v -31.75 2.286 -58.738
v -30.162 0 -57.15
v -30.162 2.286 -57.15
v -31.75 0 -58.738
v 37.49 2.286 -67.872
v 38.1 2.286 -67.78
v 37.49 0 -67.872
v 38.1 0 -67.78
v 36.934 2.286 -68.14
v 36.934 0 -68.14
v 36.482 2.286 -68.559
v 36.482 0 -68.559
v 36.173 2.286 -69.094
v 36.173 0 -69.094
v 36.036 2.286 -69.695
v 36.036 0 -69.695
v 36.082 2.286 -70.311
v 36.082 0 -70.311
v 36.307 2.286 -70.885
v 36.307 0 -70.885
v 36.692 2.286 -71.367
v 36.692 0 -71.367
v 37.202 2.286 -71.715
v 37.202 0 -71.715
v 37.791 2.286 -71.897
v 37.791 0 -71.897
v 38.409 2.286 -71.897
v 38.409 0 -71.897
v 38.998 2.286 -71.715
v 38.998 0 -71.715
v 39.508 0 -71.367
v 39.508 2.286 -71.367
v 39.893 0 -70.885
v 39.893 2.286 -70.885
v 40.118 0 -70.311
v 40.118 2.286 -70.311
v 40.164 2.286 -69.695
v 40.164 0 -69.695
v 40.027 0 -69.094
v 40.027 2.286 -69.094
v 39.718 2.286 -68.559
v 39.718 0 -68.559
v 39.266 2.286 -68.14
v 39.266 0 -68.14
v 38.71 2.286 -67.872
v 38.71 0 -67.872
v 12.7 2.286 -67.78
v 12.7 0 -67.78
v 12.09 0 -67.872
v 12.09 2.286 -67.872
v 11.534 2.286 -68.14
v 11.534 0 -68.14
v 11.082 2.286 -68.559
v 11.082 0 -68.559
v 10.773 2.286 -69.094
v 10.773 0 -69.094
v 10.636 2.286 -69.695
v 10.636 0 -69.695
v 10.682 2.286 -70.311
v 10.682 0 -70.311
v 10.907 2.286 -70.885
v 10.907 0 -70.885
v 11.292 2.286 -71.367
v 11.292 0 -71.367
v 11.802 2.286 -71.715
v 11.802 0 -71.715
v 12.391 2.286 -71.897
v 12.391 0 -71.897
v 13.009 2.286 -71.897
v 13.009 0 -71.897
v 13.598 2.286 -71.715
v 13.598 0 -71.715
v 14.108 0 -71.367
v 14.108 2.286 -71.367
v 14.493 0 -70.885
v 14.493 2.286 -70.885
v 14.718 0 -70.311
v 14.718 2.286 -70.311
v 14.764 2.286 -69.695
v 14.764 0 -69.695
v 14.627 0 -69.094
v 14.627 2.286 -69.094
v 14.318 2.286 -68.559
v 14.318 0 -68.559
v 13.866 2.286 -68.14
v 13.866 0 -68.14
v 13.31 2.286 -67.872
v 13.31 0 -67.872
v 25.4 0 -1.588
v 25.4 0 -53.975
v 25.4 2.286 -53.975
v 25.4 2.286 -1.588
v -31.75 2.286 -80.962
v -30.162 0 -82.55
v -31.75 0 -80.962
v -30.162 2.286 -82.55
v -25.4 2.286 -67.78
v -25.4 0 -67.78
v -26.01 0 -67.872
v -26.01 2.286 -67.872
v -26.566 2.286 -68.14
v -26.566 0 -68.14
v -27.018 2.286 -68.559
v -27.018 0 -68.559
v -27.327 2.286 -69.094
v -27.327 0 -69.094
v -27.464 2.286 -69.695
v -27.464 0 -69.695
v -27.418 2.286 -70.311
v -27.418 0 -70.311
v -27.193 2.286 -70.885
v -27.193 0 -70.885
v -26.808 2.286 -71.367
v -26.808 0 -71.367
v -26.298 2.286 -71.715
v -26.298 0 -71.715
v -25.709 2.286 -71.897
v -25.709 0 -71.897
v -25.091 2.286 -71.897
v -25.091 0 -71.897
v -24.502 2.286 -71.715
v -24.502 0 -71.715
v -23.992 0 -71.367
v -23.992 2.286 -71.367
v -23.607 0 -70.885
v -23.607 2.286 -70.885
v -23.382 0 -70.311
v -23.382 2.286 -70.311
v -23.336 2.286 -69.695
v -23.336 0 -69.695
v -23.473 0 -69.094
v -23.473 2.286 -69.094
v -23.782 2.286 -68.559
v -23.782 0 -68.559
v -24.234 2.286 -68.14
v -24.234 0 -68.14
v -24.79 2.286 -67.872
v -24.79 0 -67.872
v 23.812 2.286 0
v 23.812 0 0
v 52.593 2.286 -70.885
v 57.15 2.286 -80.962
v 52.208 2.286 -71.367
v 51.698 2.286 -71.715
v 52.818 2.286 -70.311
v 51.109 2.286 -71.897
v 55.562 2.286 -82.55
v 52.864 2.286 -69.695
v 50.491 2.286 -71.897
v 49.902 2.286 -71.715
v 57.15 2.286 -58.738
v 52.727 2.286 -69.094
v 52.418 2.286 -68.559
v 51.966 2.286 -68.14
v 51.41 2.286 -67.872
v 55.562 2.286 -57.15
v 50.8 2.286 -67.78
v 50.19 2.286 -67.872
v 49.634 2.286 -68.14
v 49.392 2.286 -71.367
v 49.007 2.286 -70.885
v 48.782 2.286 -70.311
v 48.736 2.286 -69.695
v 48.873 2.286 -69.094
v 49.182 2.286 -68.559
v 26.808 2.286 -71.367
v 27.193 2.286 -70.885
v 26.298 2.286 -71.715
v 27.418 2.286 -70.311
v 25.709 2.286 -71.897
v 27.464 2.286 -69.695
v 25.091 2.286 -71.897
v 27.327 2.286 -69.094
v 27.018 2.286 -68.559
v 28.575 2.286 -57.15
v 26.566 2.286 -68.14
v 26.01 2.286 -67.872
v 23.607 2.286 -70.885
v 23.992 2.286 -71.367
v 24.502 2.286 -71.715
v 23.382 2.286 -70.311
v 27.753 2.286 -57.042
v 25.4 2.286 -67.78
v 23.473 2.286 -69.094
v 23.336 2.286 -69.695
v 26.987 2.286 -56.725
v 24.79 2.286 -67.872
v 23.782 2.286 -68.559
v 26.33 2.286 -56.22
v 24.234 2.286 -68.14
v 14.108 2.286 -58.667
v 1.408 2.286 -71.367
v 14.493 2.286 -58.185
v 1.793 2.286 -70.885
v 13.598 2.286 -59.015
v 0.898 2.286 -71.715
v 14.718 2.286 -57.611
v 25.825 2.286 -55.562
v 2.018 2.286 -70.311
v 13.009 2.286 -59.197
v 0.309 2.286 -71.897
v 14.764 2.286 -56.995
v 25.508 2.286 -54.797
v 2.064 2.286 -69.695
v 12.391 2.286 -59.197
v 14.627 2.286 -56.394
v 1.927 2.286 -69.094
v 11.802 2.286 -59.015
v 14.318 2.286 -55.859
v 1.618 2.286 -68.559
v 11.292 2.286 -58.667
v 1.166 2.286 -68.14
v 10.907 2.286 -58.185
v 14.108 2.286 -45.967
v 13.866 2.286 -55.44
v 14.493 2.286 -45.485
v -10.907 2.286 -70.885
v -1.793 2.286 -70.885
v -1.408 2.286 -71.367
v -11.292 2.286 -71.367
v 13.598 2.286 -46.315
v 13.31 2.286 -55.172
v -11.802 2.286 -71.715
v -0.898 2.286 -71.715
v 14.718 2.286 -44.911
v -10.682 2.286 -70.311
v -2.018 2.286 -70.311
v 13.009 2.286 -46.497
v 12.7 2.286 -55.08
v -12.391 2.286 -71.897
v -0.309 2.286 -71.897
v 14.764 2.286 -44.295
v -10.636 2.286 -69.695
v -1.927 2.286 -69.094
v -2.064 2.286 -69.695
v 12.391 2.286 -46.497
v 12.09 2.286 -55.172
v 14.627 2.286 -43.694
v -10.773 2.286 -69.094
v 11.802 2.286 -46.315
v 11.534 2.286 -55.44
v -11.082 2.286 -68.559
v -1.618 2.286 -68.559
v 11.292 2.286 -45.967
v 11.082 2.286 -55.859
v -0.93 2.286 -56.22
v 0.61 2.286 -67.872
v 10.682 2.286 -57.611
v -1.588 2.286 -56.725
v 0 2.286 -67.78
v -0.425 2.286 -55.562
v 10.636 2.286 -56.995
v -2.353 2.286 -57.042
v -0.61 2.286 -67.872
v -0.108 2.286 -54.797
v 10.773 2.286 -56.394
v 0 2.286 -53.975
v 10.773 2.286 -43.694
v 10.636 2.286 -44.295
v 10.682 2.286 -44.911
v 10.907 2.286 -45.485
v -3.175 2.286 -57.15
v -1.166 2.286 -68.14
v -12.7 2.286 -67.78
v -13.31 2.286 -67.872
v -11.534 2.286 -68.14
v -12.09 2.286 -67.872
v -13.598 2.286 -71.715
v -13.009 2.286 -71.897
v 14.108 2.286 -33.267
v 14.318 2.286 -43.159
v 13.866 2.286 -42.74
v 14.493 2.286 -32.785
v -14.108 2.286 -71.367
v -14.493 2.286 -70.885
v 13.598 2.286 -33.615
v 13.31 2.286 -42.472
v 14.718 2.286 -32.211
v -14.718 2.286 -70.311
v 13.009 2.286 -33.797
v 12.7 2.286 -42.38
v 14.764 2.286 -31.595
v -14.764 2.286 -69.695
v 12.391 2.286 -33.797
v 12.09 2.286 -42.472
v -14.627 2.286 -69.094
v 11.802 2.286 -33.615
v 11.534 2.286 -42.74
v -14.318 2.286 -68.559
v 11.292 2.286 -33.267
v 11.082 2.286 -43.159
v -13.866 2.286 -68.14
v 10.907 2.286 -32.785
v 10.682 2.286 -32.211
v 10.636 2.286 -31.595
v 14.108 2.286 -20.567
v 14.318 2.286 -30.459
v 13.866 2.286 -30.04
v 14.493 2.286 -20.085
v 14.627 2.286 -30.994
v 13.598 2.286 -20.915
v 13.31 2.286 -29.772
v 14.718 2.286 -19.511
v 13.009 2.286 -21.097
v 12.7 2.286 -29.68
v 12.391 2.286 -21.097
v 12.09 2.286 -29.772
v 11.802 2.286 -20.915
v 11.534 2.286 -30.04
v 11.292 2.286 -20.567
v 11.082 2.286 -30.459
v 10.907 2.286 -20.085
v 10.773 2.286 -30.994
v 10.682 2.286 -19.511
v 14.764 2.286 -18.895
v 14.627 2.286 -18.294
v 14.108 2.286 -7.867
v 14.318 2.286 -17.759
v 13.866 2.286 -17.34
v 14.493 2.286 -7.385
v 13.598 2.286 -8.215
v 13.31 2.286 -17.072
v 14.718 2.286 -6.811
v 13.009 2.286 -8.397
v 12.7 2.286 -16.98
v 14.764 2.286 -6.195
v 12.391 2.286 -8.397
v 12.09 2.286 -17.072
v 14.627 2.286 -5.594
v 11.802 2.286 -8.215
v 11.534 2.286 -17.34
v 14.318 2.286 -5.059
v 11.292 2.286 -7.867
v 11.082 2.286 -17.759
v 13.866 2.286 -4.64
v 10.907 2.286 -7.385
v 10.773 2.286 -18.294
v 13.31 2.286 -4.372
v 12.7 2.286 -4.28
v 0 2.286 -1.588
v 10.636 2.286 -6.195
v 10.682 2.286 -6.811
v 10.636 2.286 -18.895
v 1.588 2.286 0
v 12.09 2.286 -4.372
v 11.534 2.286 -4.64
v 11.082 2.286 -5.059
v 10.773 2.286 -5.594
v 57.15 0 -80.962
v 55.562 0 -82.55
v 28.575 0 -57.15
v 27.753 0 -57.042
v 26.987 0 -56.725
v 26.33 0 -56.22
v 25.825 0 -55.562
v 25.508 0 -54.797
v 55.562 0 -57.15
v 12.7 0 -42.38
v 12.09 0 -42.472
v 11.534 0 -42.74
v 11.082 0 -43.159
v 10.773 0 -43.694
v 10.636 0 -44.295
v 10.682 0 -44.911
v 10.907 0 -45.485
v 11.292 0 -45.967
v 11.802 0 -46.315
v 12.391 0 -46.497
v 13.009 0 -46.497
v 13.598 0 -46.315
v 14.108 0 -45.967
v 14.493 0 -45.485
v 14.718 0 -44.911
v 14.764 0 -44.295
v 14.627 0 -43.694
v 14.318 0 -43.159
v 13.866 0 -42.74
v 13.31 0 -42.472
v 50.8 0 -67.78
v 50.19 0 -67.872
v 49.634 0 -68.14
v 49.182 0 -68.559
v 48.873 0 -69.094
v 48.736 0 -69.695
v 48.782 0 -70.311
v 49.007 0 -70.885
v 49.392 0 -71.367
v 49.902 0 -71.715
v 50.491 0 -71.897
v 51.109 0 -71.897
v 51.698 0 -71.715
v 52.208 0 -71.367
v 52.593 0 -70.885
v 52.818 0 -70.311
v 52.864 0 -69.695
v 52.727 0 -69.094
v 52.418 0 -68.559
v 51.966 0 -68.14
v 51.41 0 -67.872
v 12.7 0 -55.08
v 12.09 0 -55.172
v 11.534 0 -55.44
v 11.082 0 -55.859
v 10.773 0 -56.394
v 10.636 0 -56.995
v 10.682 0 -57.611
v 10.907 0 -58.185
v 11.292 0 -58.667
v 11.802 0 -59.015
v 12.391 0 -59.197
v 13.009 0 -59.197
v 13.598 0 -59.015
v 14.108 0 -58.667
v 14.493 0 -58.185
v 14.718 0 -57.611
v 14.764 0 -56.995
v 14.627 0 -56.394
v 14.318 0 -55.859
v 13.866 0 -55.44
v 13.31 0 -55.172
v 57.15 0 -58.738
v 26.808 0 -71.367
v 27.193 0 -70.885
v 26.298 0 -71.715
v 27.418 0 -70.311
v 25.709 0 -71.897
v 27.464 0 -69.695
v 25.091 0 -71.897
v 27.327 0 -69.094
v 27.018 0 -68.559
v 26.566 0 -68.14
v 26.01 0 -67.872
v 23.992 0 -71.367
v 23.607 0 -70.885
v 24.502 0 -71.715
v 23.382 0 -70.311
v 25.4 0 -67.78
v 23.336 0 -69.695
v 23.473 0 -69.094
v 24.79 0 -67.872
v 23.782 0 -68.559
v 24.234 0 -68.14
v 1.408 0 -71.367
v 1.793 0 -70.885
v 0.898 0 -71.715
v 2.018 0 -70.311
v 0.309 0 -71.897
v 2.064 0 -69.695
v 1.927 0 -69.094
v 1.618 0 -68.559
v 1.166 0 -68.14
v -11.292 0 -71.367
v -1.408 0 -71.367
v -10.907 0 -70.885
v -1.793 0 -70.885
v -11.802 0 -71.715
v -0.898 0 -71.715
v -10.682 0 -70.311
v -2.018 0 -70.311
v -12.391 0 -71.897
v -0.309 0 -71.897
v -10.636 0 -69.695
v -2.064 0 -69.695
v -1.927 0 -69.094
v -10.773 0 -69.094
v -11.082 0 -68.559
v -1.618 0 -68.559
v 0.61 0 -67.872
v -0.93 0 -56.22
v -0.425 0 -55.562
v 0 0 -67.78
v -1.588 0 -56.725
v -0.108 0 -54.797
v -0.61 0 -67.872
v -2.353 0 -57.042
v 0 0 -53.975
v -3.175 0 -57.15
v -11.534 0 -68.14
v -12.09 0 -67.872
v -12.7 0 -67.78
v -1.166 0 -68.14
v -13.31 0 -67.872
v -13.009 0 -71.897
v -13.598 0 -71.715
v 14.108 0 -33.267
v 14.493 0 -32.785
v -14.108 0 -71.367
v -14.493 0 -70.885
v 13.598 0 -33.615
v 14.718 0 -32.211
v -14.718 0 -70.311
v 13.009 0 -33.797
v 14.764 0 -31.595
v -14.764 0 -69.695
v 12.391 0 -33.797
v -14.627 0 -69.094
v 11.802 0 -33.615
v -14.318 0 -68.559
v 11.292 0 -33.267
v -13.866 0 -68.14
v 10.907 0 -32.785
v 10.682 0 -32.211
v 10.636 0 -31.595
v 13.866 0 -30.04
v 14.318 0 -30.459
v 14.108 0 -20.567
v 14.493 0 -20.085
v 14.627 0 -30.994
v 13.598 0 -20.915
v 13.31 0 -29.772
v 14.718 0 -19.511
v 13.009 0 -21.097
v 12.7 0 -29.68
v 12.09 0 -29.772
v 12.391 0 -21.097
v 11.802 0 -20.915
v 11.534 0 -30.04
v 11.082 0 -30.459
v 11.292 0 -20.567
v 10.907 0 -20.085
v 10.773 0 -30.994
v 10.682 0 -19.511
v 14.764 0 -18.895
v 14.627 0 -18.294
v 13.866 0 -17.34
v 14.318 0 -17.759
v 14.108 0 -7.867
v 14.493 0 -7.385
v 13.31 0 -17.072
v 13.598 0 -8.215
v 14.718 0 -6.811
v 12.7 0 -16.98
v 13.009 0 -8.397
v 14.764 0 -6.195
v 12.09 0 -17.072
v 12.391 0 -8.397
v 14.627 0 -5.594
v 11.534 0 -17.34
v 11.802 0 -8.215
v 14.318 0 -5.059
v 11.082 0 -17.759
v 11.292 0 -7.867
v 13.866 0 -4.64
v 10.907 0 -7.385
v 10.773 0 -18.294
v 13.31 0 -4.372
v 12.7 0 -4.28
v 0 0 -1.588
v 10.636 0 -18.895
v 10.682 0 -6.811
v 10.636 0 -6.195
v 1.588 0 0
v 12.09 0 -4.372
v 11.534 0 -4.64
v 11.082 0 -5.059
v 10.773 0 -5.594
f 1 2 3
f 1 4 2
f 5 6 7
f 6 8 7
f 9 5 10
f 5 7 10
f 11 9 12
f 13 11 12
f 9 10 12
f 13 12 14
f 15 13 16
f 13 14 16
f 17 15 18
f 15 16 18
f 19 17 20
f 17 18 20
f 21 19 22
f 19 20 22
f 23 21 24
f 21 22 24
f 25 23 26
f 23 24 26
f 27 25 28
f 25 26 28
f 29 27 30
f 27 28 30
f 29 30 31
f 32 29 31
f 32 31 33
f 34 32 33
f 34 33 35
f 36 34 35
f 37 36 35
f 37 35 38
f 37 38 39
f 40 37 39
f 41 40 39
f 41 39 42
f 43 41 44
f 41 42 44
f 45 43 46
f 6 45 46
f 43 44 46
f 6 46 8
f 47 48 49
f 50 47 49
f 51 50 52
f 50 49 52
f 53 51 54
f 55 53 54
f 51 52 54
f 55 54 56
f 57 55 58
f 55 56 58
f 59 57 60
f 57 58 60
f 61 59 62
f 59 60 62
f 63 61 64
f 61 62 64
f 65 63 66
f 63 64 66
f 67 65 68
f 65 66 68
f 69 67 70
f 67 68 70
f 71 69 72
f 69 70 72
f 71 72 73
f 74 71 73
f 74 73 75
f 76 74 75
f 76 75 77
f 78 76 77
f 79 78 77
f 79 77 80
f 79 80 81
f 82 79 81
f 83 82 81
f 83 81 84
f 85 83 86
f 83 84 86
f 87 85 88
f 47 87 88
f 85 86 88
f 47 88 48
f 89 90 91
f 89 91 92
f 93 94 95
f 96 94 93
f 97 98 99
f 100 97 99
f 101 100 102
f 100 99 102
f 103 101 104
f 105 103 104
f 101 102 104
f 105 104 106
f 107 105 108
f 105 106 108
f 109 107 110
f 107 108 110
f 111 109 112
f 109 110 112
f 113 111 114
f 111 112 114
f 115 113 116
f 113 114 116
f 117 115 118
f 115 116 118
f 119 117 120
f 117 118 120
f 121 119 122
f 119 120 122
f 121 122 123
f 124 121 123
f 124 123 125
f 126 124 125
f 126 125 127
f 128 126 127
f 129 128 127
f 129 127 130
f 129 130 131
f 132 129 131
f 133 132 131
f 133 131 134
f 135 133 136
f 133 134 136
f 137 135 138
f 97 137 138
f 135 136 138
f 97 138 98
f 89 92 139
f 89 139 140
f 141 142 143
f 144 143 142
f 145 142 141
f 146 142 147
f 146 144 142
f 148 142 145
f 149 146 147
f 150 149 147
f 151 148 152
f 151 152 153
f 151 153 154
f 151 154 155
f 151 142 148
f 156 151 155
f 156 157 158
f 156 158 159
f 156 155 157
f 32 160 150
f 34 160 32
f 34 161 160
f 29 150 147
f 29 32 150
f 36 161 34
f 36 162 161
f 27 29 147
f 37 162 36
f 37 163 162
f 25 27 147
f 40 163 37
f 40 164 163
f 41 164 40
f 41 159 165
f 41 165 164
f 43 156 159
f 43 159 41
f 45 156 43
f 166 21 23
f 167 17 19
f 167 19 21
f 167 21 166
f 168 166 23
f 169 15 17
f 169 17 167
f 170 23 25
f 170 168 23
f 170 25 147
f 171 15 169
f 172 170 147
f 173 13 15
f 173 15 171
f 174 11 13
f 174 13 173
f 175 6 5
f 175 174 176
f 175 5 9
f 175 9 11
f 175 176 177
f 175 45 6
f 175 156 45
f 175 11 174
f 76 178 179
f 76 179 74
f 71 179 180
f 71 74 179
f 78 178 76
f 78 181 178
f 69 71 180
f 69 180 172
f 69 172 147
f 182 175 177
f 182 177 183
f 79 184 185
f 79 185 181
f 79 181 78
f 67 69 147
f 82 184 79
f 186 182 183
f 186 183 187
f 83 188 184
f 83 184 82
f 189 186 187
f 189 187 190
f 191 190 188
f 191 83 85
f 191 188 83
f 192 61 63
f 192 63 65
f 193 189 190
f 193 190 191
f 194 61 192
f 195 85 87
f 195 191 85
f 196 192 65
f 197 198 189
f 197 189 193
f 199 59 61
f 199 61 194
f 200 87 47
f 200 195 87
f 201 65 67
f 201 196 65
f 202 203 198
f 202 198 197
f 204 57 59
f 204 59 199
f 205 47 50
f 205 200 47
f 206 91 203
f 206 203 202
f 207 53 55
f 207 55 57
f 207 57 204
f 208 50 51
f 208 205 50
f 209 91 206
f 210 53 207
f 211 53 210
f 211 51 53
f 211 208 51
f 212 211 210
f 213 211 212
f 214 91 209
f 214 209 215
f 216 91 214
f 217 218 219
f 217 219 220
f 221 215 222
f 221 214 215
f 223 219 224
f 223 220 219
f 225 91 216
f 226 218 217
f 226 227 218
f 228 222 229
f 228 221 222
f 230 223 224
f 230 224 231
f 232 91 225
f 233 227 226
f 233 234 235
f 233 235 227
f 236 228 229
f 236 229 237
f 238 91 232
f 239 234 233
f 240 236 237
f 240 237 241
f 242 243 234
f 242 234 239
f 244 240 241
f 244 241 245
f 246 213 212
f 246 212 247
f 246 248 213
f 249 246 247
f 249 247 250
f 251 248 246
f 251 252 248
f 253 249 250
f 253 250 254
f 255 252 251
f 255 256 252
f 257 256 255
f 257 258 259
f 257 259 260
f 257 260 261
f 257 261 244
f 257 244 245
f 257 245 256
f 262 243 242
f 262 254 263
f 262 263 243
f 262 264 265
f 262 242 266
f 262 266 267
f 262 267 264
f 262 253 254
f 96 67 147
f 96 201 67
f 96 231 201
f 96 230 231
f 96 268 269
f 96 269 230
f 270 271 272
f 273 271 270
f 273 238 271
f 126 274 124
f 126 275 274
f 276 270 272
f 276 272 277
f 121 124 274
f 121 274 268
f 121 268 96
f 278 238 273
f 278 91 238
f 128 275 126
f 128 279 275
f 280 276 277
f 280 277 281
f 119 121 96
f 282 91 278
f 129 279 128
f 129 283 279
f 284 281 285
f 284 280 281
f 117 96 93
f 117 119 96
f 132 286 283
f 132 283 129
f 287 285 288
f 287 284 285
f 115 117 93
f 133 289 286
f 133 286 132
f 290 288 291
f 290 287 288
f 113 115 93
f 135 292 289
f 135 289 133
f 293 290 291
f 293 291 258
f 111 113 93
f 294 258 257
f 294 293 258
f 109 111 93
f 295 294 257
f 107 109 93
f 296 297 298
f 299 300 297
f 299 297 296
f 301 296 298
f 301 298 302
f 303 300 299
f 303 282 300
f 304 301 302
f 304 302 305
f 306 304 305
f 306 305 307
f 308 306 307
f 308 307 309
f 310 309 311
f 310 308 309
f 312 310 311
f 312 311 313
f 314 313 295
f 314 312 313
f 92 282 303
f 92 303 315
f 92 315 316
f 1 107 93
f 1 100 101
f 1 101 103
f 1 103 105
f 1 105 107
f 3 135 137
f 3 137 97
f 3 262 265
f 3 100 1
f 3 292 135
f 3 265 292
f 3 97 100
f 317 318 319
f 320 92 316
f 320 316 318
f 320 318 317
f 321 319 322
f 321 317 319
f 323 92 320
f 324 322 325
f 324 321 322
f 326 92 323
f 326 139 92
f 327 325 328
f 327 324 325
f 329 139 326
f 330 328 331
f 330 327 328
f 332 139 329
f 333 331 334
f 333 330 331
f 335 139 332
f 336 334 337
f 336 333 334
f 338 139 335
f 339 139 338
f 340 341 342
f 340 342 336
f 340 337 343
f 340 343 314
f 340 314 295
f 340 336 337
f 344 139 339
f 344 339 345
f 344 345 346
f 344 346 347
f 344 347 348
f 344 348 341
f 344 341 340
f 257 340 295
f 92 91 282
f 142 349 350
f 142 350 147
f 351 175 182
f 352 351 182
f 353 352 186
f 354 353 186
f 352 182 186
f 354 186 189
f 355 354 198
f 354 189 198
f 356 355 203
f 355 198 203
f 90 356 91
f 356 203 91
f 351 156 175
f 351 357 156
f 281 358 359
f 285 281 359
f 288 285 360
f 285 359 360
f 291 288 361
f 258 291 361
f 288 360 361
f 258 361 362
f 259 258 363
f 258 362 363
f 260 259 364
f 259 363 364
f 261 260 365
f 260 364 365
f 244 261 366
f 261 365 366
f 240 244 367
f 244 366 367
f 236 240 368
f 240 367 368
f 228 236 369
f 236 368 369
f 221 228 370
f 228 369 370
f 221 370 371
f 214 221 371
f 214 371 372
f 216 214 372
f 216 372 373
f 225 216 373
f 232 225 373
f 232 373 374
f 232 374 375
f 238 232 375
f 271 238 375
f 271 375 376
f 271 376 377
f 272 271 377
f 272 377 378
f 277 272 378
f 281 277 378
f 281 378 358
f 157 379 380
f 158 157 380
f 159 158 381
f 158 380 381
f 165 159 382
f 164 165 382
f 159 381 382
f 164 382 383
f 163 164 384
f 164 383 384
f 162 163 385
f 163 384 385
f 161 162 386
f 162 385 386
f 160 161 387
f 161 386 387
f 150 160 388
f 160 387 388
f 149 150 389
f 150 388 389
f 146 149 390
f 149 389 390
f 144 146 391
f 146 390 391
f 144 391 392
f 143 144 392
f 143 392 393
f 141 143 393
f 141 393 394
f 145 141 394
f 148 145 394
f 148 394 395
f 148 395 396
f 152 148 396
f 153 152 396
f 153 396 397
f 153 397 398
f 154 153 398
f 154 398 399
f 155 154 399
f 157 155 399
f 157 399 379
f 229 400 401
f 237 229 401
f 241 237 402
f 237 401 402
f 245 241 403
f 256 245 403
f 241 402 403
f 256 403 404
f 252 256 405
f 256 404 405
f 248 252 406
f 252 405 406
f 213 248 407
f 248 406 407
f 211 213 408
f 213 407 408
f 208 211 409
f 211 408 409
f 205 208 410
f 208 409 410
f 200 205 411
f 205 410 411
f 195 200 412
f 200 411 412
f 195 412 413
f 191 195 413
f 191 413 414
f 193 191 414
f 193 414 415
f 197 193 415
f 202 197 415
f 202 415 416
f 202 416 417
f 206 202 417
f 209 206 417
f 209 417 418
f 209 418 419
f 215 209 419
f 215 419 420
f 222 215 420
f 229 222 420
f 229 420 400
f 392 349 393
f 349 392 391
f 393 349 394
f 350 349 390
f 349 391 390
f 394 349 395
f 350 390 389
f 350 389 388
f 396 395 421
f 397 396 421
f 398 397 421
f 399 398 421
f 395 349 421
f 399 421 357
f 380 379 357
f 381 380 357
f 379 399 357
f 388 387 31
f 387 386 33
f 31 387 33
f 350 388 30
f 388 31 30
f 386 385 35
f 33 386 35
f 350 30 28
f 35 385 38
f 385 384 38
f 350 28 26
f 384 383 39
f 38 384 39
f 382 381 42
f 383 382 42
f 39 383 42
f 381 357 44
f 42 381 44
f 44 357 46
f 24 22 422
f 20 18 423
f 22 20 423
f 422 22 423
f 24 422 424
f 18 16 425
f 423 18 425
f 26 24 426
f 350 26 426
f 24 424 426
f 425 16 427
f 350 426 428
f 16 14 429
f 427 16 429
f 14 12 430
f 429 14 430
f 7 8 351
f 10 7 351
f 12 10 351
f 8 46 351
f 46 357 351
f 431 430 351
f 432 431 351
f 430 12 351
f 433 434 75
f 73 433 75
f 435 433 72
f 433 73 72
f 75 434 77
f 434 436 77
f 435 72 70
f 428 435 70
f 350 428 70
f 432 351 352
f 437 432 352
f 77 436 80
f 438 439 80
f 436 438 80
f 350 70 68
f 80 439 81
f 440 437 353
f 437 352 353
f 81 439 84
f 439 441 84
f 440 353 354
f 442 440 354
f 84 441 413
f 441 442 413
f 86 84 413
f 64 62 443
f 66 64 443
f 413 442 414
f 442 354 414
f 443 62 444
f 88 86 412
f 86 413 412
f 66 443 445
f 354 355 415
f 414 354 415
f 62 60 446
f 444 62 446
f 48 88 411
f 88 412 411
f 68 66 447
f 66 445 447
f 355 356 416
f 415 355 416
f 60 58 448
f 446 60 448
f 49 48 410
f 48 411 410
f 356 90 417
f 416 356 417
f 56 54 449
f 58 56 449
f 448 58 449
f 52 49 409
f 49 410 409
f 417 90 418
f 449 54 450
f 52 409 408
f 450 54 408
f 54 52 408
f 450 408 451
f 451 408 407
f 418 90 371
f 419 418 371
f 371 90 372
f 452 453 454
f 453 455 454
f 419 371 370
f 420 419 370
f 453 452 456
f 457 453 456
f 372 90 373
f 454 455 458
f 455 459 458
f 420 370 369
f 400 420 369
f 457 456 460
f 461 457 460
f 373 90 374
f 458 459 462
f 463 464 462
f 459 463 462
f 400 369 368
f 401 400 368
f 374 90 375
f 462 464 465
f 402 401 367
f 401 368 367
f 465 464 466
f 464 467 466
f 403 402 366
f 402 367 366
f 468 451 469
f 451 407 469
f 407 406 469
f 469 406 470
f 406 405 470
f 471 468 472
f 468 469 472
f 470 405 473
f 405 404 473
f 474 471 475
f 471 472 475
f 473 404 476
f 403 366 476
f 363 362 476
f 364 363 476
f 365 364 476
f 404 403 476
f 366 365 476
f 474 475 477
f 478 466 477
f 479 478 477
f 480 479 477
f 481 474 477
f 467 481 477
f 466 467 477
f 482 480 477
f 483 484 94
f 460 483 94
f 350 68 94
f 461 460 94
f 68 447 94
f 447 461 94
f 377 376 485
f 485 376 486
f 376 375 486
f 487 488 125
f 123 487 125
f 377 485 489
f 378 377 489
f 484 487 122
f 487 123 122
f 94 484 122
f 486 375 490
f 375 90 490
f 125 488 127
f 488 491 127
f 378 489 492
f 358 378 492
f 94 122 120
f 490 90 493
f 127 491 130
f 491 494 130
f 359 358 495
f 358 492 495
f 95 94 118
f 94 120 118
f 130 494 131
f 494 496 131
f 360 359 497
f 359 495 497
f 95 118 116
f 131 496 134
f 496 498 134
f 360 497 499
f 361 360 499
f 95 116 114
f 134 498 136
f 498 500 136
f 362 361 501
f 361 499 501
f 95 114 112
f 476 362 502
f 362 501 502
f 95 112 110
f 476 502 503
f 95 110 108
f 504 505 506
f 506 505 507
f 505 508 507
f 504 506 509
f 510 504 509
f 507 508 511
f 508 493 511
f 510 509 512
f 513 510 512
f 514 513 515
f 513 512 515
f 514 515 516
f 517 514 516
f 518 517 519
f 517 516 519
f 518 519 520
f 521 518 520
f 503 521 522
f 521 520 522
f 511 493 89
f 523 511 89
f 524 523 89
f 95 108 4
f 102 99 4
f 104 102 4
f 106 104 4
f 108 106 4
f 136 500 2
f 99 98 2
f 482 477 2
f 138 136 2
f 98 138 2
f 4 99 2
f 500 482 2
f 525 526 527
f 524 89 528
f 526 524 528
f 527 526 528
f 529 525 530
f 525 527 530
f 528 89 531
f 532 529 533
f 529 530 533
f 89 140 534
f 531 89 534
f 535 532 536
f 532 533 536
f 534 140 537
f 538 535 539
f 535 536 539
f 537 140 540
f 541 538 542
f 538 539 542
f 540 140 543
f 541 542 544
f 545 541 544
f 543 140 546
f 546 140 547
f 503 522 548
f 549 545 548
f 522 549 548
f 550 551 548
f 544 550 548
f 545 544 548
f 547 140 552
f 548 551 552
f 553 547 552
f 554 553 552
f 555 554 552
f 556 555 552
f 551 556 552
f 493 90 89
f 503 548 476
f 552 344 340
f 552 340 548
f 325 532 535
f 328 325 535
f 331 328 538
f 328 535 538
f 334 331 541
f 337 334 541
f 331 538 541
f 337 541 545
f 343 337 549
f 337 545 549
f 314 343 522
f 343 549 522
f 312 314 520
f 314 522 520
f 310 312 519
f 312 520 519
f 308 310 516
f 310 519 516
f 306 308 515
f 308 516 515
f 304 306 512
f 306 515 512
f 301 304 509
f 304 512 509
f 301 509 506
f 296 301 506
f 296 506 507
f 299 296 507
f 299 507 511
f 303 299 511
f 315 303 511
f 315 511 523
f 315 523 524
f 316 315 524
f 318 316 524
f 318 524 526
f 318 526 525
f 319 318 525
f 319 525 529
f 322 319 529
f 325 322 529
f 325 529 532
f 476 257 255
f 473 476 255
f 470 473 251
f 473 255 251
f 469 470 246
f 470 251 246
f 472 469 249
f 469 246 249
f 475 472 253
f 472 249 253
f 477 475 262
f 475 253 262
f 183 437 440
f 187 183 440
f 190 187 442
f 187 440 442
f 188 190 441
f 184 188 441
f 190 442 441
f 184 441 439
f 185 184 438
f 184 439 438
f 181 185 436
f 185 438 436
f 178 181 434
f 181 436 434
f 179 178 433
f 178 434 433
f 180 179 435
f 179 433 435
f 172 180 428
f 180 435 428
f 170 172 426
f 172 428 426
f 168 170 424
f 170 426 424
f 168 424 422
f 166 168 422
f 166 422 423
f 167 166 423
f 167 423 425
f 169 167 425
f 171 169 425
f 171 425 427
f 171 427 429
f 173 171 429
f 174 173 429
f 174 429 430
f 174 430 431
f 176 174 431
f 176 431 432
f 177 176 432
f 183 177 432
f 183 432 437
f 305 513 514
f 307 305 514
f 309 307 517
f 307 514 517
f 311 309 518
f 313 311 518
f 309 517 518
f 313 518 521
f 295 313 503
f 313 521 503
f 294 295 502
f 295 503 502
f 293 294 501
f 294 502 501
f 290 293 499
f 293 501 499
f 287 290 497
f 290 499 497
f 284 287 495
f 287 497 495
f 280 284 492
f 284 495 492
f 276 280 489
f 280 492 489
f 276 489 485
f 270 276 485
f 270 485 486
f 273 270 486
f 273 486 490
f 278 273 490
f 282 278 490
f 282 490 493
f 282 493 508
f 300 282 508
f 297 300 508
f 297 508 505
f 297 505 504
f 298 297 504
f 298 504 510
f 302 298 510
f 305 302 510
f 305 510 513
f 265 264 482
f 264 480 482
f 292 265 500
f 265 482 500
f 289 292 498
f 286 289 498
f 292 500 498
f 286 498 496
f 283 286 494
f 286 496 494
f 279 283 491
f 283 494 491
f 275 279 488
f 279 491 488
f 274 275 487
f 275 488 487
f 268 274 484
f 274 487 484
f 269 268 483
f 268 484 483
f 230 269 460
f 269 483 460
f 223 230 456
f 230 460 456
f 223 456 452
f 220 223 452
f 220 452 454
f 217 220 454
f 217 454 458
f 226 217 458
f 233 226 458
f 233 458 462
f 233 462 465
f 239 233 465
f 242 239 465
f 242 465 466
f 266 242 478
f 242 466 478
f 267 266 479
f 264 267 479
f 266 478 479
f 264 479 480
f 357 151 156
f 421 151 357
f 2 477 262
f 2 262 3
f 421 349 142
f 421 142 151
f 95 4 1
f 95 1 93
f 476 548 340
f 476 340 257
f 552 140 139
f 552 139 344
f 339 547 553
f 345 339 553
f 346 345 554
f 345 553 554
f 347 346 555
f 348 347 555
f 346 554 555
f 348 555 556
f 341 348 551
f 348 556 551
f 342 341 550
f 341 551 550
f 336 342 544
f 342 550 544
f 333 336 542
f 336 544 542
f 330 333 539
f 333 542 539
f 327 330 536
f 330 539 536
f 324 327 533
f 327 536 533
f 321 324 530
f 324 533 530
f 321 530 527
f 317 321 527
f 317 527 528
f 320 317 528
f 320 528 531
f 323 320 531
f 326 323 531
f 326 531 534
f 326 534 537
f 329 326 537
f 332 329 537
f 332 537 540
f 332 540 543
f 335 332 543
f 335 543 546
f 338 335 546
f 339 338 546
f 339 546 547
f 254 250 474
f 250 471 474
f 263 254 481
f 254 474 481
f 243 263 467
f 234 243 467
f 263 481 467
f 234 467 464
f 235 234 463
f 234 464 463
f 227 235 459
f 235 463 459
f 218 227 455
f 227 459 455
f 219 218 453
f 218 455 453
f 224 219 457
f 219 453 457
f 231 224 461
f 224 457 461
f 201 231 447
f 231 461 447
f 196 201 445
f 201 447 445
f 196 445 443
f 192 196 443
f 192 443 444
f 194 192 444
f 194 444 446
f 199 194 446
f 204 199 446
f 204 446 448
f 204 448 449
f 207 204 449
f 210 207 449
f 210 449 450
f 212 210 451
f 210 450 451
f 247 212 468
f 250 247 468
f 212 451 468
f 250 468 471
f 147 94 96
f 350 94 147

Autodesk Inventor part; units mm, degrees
ref_plane "YZ Plane" through (0, 0, 0) normal (1, 0, 0) x (0, 1, 0)
ref_plane "XZ Plane" through (0, 0, 0) normal (0, 1, 0) x (-1, 0, 0)
ref_plane "XY Plane" through (0, 0, 0) normal (0, 0, 1) x (1, 0, 0)
sketch "Sketch1" plane through (0, 0, 0) normal (0, 1, 0) x (-1, 0, 0)
  line L0 (0, 0) -> (0, -57.15)
  line L1 (0, -57.15) -> (31.75, -57.15)
  line L2 (31.75, -57.15) -> (31.75, -82.55)
  line L3 (31.75, -82.55) -> (-57.15, -82.55)
  line L4 (-57.15, -82.55) -> (-57.15, -57.15)
  line L5 (-57.15, -57.15) -> (-25.4, -57.15)
  line L6 (-25.4, -57.15) -> (-25.4, 0)
  line L7 (-25.4, 0) -> (0, 0)
  dimension "d0" = 88.9
  dimension "d1" = 25.4
  dimension "d2" = 25.4
  dimension "d3" = 31.75
  dimension "d4" = 82.55
extrude "Extrusion1" add sketch "Sketch1" along normal blind 2.286
fillet "Fillet1" radius 3.175 2 edges at (25.4, 1.143, -57.15) (0, 1.143, -57.15)
chamfer "Chamfer1" distance 1.5875 angle 45 6 edges at (0, 1.143, 0) (25.4, 1.143, 0) (57.15, 1.143, -57.15) (57.15, 1.143, -82.55) (-31.75, 1.143, -57.15) (-31.75, 1.143, -82.55)
sketch "Sketch2" plane through (0, 2.286, 0) normal (0, 1, 0) x (1, 0, 0)
  line L0 (55.5625, 82.55) -> (-30.1625, 82.55) projected
  line L1 (25.4, 1.5875) -> (25.4, 53.975) projected
  point P0 (0, 0)
  point P1 (12.7, 69.85)
  dimension "d11" = 12.7
  dimension "d12" = 12.7
hole "Hole1" at (12.7, 2.286, -69.85) direction (0, -1, 0) diameter 4.1402 end through all
pattern_linear "Rectangular Pattern1" count 6 spacing 12.7 along (0, 0, 1) of "Hole1"
pattern_linear "Rectangular Pattern2" count 7 spacing 12.7 along (-1, 0, 0) of "Hole1" first direction both ways yes
properties part number "T Gusset"
